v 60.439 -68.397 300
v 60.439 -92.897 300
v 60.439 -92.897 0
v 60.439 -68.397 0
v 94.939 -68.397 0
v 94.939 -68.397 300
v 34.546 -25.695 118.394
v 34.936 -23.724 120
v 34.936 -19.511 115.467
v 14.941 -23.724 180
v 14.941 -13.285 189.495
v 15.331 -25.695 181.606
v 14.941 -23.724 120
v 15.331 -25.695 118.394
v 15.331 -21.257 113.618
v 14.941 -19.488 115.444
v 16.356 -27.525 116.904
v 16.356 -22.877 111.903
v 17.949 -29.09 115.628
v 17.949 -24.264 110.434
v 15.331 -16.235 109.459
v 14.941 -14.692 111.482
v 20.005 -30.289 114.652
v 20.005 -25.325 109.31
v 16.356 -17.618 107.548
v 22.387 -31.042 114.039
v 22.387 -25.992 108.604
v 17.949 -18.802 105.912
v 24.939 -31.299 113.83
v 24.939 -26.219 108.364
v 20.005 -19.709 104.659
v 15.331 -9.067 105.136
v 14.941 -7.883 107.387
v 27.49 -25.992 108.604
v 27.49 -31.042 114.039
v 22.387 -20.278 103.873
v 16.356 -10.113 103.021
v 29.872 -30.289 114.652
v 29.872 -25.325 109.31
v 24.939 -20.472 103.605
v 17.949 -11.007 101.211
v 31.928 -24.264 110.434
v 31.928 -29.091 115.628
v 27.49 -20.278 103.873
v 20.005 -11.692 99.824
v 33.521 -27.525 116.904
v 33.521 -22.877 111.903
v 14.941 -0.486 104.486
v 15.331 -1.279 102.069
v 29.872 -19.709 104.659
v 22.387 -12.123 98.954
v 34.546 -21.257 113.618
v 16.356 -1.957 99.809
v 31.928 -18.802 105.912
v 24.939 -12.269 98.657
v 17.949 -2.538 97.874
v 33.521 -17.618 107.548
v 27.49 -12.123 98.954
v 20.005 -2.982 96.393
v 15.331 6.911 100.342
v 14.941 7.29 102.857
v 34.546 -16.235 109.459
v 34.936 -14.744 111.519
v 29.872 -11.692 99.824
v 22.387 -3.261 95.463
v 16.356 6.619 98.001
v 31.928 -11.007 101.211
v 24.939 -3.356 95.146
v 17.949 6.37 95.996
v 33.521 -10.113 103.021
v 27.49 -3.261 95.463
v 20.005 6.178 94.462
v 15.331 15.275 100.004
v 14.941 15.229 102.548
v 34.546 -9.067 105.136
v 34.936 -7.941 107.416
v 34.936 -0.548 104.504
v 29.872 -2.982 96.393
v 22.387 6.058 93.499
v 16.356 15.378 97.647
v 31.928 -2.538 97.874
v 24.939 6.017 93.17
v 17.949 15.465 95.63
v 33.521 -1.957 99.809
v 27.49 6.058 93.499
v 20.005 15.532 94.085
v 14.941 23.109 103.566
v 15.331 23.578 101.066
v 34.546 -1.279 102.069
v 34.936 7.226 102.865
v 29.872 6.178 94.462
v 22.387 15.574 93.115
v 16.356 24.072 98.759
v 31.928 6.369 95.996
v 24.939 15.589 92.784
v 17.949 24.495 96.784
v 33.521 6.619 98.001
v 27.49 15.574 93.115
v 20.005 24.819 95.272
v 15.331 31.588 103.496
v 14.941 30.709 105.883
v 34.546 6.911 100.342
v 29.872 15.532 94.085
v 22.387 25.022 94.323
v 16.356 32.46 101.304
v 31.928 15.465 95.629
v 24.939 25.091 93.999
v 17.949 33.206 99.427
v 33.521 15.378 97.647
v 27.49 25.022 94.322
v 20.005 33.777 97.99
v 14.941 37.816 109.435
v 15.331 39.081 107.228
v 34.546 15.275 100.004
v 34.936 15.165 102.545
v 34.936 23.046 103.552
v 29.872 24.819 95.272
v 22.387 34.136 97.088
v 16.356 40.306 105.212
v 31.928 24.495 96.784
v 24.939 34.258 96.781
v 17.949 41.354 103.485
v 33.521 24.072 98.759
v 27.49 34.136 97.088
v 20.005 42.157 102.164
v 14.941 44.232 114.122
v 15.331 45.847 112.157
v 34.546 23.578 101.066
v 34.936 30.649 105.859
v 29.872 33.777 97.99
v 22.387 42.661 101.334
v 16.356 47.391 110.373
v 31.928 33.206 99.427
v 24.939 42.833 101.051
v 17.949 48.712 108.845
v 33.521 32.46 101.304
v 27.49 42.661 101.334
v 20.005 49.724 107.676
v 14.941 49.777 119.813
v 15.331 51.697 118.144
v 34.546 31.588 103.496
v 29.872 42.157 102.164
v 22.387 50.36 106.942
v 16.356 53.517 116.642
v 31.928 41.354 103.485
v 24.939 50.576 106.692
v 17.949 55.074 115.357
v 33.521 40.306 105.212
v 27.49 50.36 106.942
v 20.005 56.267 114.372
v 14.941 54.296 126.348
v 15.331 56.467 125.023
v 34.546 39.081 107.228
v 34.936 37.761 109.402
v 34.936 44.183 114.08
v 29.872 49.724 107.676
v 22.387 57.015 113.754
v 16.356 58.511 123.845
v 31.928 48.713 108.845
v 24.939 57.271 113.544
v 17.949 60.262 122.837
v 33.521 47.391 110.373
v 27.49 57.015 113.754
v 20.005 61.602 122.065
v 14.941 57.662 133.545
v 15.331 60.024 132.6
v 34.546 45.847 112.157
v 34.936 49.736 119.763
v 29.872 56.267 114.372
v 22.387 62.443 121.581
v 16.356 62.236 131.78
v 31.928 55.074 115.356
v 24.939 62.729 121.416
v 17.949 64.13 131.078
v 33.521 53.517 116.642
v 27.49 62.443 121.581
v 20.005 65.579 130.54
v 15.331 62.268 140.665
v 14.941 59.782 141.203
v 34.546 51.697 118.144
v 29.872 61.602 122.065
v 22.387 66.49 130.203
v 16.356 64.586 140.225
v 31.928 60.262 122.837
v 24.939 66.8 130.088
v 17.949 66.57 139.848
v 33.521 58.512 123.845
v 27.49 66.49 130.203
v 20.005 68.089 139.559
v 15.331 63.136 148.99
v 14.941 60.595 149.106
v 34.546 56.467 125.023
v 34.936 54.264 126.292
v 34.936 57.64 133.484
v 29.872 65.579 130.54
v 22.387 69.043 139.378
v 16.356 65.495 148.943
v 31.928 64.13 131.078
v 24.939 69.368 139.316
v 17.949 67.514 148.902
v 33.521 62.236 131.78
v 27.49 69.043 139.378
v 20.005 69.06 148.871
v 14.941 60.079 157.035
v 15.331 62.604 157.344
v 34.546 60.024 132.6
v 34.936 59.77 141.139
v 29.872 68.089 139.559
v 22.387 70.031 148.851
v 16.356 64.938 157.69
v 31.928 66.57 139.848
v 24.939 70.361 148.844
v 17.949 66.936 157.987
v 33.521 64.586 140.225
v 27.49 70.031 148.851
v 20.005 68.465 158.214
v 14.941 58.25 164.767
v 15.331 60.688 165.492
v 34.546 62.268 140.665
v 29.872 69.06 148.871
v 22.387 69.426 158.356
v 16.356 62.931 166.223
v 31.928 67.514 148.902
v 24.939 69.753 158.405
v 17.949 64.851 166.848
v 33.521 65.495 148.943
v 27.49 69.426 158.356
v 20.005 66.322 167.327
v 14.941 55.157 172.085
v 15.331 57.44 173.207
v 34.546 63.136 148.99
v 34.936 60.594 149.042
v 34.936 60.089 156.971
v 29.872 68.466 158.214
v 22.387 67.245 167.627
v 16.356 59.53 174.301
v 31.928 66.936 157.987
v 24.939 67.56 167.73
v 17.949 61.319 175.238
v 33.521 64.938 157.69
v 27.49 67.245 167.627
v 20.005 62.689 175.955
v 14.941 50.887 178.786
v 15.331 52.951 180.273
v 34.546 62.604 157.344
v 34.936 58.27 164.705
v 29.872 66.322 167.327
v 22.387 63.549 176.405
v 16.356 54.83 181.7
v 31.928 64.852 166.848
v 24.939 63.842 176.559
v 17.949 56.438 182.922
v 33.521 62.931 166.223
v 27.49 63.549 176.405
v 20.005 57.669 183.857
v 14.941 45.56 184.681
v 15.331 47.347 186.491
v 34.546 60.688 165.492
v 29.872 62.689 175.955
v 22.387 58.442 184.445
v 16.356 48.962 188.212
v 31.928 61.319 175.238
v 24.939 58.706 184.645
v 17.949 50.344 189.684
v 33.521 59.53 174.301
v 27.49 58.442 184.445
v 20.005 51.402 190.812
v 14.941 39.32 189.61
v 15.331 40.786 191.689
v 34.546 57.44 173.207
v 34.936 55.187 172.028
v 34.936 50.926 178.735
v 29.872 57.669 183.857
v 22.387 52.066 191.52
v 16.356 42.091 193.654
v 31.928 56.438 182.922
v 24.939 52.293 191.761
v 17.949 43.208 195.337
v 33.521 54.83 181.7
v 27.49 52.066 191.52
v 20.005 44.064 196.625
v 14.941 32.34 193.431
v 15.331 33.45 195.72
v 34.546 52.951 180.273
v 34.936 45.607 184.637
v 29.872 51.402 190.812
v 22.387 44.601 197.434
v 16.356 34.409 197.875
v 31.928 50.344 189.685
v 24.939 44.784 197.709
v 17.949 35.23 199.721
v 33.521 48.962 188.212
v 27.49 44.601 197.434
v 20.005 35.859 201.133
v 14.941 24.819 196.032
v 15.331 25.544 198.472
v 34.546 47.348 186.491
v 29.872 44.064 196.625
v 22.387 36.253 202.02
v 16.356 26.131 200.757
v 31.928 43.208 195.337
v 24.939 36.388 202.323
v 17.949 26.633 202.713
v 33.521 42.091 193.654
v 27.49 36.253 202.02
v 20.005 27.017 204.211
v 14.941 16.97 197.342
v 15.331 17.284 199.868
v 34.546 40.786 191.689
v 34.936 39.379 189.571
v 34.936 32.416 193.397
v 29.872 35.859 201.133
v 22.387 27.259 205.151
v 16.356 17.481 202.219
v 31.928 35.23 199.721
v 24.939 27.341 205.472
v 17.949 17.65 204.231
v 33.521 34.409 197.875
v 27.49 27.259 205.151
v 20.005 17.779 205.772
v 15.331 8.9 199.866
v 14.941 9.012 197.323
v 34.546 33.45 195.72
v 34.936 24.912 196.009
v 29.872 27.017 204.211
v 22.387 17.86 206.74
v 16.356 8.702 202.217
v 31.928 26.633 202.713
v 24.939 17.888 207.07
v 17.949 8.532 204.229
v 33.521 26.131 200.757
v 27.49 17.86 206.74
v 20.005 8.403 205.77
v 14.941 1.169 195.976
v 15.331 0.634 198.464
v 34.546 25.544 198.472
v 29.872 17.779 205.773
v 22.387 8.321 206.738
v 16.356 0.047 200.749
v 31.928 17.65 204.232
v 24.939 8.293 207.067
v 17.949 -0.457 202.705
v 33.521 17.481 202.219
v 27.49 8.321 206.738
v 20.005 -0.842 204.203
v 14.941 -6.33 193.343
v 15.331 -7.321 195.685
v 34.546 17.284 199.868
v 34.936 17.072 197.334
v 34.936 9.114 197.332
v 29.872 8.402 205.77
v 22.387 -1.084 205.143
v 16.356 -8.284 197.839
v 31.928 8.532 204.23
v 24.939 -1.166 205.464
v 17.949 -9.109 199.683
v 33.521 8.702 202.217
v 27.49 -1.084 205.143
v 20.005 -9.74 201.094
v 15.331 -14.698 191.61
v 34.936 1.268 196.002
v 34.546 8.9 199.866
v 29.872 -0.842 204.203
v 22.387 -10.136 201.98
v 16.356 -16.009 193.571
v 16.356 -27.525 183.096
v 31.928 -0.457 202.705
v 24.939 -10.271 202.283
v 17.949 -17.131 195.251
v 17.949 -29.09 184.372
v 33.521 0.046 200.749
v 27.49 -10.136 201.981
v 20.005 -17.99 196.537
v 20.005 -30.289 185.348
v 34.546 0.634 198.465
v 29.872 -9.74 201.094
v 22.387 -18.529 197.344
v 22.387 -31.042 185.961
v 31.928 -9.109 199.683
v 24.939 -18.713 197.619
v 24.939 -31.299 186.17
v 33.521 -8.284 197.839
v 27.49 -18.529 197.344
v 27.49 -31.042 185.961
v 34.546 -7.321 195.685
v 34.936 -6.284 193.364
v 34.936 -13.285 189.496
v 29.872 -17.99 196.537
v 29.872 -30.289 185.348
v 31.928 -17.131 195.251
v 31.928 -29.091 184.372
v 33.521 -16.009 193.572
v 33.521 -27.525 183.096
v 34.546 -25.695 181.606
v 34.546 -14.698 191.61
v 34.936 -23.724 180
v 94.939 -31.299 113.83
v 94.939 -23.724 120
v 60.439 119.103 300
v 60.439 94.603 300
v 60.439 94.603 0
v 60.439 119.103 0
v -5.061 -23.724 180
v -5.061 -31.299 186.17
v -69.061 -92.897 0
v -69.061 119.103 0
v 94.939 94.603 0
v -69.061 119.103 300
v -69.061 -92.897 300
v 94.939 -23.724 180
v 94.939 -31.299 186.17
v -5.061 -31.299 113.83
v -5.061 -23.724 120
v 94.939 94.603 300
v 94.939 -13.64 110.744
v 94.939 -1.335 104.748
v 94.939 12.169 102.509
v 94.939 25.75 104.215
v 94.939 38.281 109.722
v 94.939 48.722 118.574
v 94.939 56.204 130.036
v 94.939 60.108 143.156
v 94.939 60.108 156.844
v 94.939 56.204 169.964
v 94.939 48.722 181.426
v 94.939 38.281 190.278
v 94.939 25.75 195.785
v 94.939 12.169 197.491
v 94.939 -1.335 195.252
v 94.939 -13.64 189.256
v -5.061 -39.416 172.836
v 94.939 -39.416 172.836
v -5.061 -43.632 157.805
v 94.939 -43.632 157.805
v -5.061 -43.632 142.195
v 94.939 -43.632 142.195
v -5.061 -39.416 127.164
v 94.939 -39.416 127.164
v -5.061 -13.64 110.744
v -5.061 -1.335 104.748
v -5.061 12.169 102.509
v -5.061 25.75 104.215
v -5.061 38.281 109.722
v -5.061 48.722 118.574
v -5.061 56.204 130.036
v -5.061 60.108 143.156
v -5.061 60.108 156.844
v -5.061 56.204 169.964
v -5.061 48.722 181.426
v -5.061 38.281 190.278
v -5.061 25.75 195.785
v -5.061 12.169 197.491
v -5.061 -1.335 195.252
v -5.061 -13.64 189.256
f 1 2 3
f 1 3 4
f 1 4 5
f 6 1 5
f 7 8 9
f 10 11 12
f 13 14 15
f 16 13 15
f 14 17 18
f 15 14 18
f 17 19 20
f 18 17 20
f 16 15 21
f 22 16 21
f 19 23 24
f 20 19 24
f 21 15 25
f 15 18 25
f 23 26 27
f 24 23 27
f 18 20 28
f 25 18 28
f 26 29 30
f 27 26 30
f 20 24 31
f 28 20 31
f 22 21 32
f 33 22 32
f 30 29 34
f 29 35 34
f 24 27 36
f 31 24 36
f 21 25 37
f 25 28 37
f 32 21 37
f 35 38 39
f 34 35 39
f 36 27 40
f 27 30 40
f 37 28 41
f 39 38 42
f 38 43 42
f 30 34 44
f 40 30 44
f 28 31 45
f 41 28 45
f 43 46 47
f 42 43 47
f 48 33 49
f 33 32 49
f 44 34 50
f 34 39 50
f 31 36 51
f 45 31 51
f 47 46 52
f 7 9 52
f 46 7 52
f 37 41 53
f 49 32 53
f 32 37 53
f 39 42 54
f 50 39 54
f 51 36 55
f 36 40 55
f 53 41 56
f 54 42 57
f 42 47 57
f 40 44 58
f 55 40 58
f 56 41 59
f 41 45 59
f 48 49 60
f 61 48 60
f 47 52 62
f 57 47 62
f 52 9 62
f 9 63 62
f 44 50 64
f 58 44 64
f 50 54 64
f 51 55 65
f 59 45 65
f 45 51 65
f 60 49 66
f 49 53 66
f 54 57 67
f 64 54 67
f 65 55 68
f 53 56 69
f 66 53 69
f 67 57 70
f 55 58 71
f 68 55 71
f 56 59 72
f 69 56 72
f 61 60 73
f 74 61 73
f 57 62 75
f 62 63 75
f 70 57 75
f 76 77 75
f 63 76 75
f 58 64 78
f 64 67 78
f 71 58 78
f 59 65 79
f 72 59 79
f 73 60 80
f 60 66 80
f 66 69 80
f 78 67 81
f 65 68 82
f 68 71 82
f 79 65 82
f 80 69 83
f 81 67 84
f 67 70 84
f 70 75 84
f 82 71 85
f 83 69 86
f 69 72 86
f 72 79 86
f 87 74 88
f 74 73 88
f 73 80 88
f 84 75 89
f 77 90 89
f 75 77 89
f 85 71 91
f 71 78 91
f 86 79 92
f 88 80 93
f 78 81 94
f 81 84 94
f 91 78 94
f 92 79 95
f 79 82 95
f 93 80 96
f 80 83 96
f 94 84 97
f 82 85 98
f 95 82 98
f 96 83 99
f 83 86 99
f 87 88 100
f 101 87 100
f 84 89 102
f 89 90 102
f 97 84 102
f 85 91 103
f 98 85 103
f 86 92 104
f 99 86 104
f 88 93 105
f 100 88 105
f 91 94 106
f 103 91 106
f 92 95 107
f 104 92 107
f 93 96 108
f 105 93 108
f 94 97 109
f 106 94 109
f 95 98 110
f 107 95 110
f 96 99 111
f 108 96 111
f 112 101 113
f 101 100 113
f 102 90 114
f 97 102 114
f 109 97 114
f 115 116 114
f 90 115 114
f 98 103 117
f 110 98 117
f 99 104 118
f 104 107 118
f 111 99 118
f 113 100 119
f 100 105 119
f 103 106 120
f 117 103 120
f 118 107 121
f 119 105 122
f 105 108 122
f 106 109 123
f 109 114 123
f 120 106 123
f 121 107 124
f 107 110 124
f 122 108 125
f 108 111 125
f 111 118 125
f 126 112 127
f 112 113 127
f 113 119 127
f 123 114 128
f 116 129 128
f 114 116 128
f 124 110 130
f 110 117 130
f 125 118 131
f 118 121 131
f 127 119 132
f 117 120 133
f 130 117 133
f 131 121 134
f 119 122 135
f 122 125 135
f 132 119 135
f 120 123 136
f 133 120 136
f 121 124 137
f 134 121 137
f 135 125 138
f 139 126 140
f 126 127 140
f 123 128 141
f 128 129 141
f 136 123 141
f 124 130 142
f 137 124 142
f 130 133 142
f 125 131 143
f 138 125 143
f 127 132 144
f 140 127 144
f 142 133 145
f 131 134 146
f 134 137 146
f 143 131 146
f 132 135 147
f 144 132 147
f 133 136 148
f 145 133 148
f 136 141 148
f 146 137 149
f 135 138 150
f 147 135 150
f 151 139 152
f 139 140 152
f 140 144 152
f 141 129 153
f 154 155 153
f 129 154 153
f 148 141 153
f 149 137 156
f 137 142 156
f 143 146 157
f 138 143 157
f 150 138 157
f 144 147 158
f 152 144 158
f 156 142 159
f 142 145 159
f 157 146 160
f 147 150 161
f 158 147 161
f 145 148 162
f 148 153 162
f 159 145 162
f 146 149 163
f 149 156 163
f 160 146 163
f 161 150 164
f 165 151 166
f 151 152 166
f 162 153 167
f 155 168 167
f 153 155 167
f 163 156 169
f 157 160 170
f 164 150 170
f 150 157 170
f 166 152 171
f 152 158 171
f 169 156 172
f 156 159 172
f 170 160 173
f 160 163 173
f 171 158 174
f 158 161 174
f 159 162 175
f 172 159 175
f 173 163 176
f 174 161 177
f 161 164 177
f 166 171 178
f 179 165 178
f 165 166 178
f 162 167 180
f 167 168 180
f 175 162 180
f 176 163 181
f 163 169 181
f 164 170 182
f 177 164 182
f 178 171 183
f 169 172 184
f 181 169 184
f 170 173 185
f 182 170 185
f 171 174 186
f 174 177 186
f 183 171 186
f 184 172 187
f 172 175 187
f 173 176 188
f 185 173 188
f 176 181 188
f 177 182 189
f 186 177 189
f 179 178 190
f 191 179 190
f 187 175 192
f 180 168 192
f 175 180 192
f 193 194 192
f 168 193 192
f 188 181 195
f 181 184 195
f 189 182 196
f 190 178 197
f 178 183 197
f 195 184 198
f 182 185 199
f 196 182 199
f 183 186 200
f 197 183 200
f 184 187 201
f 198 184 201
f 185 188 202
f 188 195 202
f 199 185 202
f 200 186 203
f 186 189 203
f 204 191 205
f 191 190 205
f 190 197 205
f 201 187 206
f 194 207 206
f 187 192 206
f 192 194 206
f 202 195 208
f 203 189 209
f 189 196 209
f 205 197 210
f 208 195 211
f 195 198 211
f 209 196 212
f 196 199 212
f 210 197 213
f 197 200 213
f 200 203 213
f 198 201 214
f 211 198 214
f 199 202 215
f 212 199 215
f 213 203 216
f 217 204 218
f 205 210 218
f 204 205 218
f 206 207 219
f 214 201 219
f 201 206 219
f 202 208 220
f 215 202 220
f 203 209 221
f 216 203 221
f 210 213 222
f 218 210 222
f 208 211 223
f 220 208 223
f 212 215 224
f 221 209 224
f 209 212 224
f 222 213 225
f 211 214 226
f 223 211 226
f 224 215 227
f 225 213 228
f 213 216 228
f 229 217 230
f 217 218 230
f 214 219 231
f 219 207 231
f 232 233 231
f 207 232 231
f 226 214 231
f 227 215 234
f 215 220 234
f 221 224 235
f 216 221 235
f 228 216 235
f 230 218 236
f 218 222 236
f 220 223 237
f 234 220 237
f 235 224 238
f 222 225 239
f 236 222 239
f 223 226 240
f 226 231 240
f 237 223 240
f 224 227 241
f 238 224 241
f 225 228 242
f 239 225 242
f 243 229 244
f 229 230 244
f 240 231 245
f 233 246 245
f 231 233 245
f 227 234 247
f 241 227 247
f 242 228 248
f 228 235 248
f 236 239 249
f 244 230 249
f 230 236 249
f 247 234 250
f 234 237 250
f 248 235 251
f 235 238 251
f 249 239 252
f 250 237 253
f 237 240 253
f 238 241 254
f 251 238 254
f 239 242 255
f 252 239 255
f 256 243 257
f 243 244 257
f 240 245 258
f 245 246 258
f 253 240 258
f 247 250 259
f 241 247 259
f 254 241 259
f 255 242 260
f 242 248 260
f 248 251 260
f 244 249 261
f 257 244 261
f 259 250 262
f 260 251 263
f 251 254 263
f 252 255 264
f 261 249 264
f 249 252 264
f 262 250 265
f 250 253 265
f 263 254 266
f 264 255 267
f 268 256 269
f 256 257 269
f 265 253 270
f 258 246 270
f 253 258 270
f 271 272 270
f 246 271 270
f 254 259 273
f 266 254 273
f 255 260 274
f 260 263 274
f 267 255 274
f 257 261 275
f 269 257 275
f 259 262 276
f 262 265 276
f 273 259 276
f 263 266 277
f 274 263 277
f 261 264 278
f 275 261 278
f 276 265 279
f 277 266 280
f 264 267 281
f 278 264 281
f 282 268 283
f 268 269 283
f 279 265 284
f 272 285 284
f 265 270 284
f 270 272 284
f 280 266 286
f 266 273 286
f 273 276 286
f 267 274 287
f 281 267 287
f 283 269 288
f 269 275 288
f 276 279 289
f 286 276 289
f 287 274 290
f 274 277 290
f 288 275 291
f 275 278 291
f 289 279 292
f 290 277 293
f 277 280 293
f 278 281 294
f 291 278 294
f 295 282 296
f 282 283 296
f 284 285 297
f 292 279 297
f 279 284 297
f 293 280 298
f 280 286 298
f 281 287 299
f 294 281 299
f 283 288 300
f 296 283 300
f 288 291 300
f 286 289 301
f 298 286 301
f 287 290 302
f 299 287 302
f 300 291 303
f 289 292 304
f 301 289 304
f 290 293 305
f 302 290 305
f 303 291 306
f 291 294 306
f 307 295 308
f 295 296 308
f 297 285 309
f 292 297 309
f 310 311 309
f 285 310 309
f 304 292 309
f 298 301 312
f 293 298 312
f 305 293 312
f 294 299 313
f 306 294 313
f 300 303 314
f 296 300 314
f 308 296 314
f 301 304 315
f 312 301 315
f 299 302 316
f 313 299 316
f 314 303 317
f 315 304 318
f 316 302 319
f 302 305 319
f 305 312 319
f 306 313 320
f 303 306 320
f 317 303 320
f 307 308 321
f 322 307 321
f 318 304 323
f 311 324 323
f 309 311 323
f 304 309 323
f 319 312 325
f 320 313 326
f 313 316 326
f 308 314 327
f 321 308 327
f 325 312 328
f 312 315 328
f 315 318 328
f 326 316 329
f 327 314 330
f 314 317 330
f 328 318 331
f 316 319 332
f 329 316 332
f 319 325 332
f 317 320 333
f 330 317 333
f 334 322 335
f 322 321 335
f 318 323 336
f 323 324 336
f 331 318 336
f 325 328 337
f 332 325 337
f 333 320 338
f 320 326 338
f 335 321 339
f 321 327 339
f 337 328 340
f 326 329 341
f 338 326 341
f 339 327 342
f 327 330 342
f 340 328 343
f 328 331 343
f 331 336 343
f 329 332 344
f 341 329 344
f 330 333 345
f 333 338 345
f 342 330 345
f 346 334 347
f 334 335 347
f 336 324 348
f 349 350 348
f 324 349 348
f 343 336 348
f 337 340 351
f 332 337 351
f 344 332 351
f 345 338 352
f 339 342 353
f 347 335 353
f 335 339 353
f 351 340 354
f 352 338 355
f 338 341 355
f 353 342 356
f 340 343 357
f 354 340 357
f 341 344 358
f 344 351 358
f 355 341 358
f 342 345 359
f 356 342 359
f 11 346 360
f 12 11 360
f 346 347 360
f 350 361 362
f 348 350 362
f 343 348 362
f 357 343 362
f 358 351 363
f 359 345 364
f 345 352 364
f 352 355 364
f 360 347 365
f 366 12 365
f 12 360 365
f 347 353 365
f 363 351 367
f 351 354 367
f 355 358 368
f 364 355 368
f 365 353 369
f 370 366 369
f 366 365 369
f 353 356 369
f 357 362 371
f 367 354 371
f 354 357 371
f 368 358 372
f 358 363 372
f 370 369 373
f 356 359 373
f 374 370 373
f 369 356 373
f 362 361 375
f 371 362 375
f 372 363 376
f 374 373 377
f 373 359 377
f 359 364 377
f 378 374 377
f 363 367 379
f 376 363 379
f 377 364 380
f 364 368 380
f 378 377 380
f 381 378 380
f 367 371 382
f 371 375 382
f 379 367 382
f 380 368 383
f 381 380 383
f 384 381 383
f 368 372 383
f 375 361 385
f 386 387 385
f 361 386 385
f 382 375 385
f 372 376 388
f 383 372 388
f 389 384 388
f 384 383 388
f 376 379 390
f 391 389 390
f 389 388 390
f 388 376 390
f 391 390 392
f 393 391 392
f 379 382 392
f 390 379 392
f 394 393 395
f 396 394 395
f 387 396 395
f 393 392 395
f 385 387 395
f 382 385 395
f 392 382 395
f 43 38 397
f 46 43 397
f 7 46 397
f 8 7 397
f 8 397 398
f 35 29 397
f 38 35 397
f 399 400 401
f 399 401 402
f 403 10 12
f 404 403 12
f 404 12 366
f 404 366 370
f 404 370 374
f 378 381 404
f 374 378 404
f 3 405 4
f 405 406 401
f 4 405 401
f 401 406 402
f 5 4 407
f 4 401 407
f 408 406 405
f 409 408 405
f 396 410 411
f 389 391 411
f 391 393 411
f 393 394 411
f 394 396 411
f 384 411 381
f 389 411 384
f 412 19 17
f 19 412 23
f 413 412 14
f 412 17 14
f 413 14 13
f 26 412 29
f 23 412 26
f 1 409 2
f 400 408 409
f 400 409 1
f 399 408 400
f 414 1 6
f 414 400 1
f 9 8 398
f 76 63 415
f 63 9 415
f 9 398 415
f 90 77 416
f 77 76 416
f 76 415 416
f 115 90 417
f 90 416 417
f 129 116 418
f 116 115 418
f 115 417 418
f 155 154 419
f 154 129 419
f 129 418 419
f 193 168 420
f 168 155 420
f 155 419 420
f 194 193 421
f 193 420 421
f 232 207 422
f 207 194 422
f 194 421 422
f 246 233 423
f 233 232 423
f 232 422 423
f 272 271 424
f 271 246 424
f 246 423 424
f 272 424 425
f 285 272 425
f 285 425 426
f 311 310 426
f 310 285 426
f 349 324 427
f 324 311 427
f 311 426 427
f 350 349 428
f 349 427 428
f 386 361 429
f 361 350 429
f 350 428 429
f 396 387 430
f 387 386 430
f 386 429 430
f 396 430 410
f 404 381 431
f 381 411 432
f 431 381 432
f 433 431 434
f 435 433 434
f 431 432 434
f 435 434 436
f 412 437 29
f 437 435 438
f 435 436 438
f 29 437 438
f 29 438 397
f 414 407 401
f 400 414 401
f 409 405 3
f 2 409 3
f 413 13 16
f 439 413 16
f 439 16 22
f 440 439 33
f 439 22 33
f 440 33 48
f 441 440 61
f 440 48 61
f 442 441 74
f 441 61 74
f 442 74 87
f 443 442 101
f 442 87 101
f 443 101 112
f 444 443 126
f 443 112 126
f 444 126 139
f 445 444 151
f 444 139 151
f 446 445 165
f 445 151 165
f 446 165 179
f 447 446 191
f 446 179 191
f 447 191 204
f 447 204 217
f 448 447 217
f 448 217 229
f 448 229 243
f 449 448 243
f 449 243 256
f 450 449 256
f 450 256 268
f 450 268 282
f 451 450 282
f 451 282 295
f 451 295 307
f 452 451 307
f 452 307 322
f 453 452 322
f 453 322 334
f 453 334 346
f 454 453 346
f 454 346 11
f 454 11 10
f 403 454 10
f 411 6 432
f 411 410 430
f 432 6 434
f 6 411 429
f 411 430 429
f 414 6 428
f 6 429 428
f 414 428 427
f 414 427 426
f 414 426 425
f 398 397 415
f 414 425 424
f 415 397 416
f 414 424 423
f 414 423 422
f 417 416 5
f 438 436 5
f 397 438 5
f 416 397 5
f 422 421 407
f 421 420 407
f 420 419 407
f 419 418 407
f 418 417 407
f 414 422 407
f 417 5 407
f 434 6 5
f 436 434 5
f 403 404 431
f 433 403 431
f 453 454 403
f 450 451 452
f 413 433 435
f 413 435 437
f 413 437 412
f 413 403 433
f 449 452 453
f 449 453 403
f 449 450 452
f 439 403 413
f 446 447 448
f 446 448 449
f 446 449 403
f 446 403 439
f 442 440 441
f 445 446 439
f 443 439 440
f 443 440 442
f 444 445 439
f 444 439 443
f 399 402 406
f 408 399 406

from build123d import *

# Parameters (mm, degrees)
BOSS_EXTRUDE1_DEPTH = 300
SKETCH2_R           = 47.5
CUT_EXTRUDE1_DEPTH  = 100
SKETCH3_R           = 10
CUT_EXTRUDE3_REACH  = 364.052


with BuildPart() as part:
    # Sketch1 → Boss-Extrude1 (new body)
    with BuildSketch(Plane.XY):
        Polygon((94.938651754, 94.603319173), (60.438651754, 94.603319173), (60.438651754, 119.103319173), (-69.061348246, 119.103319173), (-69.061348246, -92.896680827), (60.438651754, -92.896680827), (60.438651754, -68.396680827), (94.938651754, -68.396680827), align=None)
    extrude(amount=BOSS_EXTRUDE1_DEPTH)

    # Sketch2 → Cut-Extrude1 (cut)
    with BuildSketch(Plane(origin=(94.938651754, 0, 0), x_dir=(0, 0, -1), z_dir=(1, 0, 0))):
        with Locations((-150, 13.103319173)):
            Circle(SKETCH2_R)
    extrude(amount=-CUT_EXTRUDE1_DEPTH, mode=Mode.SUBTRACT)

    # Cut-Sweep1: sweep along a path in Sketch5
    with BuildLine(Plane(origin=(25, 0, 0), x_dir=(0, 0, -1), z_dir=(1, 0, 0))) as cut_sweep1_path:
        ThreePointArc((-120, -23.723980484), (-150, 60.603319173), (-180, -23.723980484))
    # Sketch3 → Cut-Sweep1 (sweep, cut)
    with BuildSketch(Plane.XY.offset(150)):
        with Locations((24.938651754, 60.373071265)):
            Circle(SKETCH3_R)
    sweep(path=cut_sweep1_path.line, mode=Mode.SUBTRACT)

    # Cut-Extrude3: up to this face of the body (flat: up to its plane)
    cut_extrude3_end = Plane(part.part.faces().sort_by_distance((-5.061348246, 13.103319173, 150))[0])
    # Sketch7 → Cut-Extrude3 (cut, up to the picked face)
    with BuildSketch(Plane(origin=(94.938651754, 0, 0), x_dir=(0, 0, -1), z_dir=(1, 0, 0)), mode=Mode.PRIVATE) as cut_extrude3_sk1:
        with BuildLine():
            Line((-180, -23.723980484), (-186.170369742, -31.298582333))
            ThreePointArc((-186.170369742, -31.298582333), (-150, -44.166432919), (-113.829630258, -31.298582333))
            Line((-113.829630258, -31.298582333), (-120, -23.723980484))
            ThreePointArc((-120, -23.723980484), (-150, -34.396680827), (-180, -23.723980484))
        make_face()
    cut_extrude3_tool1 = split(extrude(cut_extrude3_sk1.sketch, amount=-CUT_EXTRUDE3_REACH, mode=Mode.PRIVATE), bisect_by=cut_extrude3_end, keep=Keep.BOTH, mode=Mode.PRIVATE)
    add(cut_extrude3_tool1.solids().sort_by(Axis((94.938652, -35.436268, 150), (-1, 0, 0)))[0], mode=Mode.SUBTRACT)


solid = part.part
